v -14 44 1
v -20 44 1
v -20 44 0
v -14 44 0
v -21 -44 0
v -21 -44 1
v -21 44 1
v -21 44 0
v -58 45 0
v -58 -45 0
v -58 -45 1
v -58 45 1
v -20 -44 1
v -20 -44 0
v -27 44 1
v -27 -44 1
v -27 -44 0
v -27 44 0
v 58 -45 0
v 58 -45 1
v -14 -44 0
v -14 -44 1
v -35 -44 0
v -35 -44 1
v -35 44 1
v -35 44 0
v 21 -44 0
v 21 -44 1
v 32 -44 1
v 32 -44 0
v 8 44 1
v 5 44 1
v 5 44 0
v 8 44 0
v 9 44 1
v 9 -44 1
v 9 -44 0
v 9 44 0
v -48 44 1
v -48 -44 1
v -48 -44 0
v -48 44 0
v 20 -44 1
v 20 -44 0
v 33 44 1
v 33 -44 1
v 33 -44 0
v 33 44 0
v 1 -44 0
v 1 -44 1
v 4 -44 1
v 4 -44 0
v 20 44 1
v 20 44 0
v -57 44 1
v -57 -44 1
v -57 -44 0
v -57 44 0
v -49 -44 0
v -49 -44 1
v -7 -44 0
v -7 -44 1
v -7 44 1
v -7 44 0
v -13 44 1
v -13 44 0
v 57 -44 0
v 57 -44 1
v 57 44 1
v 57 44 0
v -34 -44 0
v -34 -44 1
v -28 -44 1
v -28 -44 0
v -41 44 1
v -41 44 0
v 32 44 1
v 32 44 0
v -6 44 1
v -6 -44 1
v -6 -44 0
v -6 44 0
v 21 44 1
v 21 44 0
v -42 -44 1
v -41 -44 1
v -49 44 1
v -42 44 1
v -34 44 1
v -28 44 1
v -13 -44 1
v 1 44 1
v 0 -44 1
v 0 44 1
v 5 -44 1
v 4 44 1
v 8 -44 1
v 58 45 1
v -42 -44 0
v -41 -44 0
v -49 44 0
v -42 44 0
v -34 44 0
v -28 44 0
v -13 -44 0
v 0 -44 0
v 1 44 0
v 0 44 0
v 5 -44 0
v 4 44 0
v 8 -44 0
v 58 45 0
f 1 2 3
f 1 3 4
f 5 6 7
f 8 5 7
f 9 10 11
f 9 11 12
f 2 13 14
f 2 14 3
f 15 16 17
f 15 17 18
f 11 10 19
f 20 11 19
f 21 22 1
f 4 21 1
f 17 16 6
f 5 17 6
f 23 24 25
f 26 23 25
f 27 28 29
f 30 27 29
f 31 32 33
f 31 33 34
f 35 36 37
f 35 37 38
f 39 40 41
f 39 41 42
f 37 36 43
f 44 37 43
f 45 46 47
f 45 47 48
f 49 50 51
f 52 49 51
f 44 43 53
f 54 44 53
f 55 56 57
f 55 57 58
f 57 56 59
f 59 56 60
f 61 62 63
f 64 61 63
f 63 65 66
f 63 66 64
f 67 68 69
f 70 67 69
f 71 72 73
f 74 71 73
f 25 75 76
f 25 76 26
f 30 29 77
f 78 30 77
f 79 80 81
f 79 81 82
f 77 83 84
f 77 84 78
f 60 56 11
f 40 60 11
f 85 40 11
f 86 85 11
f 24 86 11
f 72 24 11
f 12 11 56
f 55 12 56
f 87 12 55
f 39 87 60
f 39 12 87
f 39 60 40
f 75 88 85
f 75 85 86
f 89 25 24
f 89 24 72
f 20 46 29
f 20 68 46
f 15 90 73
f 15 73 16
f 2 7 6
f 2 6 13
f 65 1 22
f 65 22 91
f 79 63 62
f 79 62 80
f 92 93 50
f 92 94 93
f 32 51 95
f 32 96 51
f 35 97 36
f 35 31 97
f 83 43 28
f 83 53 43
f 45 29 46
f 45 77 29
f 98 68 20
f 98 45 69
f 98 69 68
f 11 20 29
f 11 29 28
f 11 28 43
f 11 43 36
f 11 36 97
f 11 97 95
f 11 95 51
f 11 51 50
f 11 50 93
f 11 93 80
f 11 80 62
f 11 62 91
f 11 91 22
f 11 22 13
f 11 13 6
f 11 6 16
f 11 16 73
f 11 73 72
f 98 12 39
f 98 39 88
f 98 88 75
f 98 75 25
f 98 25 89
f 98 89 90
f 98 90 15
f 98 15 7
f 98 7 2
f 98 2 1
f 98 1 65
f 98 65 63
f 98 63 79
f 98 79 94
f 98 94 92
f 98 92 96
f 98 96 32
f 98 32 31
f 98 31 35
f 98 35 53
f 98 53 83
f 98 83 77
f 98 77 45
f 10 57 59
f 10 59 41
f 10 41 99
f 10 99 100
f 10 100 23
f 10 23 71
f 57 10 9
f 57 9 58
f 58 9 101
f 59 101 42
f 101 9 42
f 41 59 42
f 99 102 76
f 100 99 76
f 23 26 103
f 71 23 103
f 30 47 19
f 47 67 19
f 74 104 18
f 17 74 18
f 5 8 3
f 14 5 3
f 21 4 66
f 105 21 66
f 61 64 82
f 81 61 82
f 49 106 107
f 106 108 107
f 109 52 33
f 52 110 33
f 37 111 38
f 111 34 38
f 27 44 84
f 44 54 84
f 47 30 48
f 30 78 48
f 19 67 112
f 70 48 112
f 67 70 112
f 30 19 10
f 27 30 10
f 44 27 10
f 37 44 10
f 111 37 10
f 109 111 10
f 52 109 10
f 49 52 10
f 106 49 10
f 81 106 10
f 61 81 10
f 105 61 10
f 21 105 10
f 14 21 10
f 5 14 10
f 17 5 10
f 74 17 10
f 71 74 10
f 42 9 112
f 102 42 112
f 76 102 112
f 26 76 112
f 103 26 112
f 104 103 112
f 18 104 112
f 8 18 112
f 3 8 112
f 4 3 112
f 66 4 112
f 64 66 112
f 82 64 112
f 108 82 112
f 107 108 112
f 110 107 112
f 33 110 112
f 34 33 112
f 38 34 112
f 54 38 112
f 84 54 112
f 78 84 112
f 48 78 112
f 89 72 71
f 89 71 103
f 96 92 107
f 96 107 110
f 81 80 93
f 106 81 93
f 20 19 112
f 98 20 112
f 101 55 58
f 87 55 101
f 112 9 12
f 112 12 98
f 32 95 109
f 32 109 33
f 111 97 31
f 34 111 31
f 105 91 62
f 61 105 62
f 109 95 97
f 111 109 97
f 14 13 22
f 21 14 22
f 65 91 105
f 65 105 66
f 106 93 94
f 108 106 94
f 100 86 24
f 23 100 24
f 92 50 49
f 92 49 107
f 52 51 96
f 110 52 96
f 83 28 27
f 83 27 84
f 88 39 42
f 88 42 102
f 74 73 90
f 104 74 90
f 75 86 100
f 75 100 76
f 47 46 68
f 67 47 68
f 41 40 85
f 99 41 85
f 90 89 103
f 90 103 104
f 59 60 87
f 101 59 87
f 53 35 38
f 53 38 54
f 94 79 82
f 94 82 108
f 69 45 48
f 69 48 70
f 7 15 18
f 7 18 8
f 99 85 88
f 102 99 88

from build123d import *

# Parameters (mm, degrees)
F1_W     = 116
F1_H     = 90
F2_DEPTH = 1
F4_W     = 116
F4_H     = 58.6666666667
F5_DEPTH = 3
F3_W     = 8
F3_H     = 88
F3_W_2   = 6
F3_W_3   = 3
F3_W_4   = 11
F3_W_5   = 24
F6_DEPTH = 1


with BuildPart() as f2:
    # F1 (on Top) → F2 (new body)
    with BuildSketch(Plane.XY):
        Rectangle(F1_W, F1_H)
    extrude(amount=F2_DEPTH)

    # F4 (on face) → F5 (cut)
    with BuildSketch(Plane.XY.offset(1)):
        Rectangle(F4_W, F4_H)
    extrude(amount=F5_DEPTH, mode=Mode.SUBTRACT)

    # F3 (on face) → F6 (cut)
    with BuildSketch(Plane.XY.offset(1)):
        with Locations((-53, 0)):
            Rectangle(F3_W, F3_H)
        with Locations((-45, 0)):
            Rectangle(F3_W_2, F3_H)
        with Locations((-38, 0)):
            Rectangle(F3_W_2, F3_H)
        with Locations((-31, 0)):
            Rectangle(F3_W_2, F3_H)
        with Locations((-24, 0)):
            Rectangle(F3_W_2, F3_H)
        with Locations((-17, 0)):
            Rectangle(F3_W_2, F3_H)
        with Locations((-10, 0)):
            Rectangle(F3_W_2, F3_H)
        with Locations((-3, 0)):
            Rectangle(F3_W_2, F3_H)
        with Locations((2.5, 0)):
            Rectangle(F3_W_3, F3_H)
        with Locations((6.5, 0)):
            Rectangle(F3_W_3, F3_H)
        with Locations((14.5, 0)):
            Rectangle(F3_W_4, F3_H)
        with Locations((26.5, 0)):
            Rectangle(F3_W_4, F3_H)
        with Locations((45, 0)):
            Rectangle(F3_W_5, F3_H)
    extrude(amount=-F6_DEPTH, mode=Mode.SUBTRACT)


solid = f2.part
